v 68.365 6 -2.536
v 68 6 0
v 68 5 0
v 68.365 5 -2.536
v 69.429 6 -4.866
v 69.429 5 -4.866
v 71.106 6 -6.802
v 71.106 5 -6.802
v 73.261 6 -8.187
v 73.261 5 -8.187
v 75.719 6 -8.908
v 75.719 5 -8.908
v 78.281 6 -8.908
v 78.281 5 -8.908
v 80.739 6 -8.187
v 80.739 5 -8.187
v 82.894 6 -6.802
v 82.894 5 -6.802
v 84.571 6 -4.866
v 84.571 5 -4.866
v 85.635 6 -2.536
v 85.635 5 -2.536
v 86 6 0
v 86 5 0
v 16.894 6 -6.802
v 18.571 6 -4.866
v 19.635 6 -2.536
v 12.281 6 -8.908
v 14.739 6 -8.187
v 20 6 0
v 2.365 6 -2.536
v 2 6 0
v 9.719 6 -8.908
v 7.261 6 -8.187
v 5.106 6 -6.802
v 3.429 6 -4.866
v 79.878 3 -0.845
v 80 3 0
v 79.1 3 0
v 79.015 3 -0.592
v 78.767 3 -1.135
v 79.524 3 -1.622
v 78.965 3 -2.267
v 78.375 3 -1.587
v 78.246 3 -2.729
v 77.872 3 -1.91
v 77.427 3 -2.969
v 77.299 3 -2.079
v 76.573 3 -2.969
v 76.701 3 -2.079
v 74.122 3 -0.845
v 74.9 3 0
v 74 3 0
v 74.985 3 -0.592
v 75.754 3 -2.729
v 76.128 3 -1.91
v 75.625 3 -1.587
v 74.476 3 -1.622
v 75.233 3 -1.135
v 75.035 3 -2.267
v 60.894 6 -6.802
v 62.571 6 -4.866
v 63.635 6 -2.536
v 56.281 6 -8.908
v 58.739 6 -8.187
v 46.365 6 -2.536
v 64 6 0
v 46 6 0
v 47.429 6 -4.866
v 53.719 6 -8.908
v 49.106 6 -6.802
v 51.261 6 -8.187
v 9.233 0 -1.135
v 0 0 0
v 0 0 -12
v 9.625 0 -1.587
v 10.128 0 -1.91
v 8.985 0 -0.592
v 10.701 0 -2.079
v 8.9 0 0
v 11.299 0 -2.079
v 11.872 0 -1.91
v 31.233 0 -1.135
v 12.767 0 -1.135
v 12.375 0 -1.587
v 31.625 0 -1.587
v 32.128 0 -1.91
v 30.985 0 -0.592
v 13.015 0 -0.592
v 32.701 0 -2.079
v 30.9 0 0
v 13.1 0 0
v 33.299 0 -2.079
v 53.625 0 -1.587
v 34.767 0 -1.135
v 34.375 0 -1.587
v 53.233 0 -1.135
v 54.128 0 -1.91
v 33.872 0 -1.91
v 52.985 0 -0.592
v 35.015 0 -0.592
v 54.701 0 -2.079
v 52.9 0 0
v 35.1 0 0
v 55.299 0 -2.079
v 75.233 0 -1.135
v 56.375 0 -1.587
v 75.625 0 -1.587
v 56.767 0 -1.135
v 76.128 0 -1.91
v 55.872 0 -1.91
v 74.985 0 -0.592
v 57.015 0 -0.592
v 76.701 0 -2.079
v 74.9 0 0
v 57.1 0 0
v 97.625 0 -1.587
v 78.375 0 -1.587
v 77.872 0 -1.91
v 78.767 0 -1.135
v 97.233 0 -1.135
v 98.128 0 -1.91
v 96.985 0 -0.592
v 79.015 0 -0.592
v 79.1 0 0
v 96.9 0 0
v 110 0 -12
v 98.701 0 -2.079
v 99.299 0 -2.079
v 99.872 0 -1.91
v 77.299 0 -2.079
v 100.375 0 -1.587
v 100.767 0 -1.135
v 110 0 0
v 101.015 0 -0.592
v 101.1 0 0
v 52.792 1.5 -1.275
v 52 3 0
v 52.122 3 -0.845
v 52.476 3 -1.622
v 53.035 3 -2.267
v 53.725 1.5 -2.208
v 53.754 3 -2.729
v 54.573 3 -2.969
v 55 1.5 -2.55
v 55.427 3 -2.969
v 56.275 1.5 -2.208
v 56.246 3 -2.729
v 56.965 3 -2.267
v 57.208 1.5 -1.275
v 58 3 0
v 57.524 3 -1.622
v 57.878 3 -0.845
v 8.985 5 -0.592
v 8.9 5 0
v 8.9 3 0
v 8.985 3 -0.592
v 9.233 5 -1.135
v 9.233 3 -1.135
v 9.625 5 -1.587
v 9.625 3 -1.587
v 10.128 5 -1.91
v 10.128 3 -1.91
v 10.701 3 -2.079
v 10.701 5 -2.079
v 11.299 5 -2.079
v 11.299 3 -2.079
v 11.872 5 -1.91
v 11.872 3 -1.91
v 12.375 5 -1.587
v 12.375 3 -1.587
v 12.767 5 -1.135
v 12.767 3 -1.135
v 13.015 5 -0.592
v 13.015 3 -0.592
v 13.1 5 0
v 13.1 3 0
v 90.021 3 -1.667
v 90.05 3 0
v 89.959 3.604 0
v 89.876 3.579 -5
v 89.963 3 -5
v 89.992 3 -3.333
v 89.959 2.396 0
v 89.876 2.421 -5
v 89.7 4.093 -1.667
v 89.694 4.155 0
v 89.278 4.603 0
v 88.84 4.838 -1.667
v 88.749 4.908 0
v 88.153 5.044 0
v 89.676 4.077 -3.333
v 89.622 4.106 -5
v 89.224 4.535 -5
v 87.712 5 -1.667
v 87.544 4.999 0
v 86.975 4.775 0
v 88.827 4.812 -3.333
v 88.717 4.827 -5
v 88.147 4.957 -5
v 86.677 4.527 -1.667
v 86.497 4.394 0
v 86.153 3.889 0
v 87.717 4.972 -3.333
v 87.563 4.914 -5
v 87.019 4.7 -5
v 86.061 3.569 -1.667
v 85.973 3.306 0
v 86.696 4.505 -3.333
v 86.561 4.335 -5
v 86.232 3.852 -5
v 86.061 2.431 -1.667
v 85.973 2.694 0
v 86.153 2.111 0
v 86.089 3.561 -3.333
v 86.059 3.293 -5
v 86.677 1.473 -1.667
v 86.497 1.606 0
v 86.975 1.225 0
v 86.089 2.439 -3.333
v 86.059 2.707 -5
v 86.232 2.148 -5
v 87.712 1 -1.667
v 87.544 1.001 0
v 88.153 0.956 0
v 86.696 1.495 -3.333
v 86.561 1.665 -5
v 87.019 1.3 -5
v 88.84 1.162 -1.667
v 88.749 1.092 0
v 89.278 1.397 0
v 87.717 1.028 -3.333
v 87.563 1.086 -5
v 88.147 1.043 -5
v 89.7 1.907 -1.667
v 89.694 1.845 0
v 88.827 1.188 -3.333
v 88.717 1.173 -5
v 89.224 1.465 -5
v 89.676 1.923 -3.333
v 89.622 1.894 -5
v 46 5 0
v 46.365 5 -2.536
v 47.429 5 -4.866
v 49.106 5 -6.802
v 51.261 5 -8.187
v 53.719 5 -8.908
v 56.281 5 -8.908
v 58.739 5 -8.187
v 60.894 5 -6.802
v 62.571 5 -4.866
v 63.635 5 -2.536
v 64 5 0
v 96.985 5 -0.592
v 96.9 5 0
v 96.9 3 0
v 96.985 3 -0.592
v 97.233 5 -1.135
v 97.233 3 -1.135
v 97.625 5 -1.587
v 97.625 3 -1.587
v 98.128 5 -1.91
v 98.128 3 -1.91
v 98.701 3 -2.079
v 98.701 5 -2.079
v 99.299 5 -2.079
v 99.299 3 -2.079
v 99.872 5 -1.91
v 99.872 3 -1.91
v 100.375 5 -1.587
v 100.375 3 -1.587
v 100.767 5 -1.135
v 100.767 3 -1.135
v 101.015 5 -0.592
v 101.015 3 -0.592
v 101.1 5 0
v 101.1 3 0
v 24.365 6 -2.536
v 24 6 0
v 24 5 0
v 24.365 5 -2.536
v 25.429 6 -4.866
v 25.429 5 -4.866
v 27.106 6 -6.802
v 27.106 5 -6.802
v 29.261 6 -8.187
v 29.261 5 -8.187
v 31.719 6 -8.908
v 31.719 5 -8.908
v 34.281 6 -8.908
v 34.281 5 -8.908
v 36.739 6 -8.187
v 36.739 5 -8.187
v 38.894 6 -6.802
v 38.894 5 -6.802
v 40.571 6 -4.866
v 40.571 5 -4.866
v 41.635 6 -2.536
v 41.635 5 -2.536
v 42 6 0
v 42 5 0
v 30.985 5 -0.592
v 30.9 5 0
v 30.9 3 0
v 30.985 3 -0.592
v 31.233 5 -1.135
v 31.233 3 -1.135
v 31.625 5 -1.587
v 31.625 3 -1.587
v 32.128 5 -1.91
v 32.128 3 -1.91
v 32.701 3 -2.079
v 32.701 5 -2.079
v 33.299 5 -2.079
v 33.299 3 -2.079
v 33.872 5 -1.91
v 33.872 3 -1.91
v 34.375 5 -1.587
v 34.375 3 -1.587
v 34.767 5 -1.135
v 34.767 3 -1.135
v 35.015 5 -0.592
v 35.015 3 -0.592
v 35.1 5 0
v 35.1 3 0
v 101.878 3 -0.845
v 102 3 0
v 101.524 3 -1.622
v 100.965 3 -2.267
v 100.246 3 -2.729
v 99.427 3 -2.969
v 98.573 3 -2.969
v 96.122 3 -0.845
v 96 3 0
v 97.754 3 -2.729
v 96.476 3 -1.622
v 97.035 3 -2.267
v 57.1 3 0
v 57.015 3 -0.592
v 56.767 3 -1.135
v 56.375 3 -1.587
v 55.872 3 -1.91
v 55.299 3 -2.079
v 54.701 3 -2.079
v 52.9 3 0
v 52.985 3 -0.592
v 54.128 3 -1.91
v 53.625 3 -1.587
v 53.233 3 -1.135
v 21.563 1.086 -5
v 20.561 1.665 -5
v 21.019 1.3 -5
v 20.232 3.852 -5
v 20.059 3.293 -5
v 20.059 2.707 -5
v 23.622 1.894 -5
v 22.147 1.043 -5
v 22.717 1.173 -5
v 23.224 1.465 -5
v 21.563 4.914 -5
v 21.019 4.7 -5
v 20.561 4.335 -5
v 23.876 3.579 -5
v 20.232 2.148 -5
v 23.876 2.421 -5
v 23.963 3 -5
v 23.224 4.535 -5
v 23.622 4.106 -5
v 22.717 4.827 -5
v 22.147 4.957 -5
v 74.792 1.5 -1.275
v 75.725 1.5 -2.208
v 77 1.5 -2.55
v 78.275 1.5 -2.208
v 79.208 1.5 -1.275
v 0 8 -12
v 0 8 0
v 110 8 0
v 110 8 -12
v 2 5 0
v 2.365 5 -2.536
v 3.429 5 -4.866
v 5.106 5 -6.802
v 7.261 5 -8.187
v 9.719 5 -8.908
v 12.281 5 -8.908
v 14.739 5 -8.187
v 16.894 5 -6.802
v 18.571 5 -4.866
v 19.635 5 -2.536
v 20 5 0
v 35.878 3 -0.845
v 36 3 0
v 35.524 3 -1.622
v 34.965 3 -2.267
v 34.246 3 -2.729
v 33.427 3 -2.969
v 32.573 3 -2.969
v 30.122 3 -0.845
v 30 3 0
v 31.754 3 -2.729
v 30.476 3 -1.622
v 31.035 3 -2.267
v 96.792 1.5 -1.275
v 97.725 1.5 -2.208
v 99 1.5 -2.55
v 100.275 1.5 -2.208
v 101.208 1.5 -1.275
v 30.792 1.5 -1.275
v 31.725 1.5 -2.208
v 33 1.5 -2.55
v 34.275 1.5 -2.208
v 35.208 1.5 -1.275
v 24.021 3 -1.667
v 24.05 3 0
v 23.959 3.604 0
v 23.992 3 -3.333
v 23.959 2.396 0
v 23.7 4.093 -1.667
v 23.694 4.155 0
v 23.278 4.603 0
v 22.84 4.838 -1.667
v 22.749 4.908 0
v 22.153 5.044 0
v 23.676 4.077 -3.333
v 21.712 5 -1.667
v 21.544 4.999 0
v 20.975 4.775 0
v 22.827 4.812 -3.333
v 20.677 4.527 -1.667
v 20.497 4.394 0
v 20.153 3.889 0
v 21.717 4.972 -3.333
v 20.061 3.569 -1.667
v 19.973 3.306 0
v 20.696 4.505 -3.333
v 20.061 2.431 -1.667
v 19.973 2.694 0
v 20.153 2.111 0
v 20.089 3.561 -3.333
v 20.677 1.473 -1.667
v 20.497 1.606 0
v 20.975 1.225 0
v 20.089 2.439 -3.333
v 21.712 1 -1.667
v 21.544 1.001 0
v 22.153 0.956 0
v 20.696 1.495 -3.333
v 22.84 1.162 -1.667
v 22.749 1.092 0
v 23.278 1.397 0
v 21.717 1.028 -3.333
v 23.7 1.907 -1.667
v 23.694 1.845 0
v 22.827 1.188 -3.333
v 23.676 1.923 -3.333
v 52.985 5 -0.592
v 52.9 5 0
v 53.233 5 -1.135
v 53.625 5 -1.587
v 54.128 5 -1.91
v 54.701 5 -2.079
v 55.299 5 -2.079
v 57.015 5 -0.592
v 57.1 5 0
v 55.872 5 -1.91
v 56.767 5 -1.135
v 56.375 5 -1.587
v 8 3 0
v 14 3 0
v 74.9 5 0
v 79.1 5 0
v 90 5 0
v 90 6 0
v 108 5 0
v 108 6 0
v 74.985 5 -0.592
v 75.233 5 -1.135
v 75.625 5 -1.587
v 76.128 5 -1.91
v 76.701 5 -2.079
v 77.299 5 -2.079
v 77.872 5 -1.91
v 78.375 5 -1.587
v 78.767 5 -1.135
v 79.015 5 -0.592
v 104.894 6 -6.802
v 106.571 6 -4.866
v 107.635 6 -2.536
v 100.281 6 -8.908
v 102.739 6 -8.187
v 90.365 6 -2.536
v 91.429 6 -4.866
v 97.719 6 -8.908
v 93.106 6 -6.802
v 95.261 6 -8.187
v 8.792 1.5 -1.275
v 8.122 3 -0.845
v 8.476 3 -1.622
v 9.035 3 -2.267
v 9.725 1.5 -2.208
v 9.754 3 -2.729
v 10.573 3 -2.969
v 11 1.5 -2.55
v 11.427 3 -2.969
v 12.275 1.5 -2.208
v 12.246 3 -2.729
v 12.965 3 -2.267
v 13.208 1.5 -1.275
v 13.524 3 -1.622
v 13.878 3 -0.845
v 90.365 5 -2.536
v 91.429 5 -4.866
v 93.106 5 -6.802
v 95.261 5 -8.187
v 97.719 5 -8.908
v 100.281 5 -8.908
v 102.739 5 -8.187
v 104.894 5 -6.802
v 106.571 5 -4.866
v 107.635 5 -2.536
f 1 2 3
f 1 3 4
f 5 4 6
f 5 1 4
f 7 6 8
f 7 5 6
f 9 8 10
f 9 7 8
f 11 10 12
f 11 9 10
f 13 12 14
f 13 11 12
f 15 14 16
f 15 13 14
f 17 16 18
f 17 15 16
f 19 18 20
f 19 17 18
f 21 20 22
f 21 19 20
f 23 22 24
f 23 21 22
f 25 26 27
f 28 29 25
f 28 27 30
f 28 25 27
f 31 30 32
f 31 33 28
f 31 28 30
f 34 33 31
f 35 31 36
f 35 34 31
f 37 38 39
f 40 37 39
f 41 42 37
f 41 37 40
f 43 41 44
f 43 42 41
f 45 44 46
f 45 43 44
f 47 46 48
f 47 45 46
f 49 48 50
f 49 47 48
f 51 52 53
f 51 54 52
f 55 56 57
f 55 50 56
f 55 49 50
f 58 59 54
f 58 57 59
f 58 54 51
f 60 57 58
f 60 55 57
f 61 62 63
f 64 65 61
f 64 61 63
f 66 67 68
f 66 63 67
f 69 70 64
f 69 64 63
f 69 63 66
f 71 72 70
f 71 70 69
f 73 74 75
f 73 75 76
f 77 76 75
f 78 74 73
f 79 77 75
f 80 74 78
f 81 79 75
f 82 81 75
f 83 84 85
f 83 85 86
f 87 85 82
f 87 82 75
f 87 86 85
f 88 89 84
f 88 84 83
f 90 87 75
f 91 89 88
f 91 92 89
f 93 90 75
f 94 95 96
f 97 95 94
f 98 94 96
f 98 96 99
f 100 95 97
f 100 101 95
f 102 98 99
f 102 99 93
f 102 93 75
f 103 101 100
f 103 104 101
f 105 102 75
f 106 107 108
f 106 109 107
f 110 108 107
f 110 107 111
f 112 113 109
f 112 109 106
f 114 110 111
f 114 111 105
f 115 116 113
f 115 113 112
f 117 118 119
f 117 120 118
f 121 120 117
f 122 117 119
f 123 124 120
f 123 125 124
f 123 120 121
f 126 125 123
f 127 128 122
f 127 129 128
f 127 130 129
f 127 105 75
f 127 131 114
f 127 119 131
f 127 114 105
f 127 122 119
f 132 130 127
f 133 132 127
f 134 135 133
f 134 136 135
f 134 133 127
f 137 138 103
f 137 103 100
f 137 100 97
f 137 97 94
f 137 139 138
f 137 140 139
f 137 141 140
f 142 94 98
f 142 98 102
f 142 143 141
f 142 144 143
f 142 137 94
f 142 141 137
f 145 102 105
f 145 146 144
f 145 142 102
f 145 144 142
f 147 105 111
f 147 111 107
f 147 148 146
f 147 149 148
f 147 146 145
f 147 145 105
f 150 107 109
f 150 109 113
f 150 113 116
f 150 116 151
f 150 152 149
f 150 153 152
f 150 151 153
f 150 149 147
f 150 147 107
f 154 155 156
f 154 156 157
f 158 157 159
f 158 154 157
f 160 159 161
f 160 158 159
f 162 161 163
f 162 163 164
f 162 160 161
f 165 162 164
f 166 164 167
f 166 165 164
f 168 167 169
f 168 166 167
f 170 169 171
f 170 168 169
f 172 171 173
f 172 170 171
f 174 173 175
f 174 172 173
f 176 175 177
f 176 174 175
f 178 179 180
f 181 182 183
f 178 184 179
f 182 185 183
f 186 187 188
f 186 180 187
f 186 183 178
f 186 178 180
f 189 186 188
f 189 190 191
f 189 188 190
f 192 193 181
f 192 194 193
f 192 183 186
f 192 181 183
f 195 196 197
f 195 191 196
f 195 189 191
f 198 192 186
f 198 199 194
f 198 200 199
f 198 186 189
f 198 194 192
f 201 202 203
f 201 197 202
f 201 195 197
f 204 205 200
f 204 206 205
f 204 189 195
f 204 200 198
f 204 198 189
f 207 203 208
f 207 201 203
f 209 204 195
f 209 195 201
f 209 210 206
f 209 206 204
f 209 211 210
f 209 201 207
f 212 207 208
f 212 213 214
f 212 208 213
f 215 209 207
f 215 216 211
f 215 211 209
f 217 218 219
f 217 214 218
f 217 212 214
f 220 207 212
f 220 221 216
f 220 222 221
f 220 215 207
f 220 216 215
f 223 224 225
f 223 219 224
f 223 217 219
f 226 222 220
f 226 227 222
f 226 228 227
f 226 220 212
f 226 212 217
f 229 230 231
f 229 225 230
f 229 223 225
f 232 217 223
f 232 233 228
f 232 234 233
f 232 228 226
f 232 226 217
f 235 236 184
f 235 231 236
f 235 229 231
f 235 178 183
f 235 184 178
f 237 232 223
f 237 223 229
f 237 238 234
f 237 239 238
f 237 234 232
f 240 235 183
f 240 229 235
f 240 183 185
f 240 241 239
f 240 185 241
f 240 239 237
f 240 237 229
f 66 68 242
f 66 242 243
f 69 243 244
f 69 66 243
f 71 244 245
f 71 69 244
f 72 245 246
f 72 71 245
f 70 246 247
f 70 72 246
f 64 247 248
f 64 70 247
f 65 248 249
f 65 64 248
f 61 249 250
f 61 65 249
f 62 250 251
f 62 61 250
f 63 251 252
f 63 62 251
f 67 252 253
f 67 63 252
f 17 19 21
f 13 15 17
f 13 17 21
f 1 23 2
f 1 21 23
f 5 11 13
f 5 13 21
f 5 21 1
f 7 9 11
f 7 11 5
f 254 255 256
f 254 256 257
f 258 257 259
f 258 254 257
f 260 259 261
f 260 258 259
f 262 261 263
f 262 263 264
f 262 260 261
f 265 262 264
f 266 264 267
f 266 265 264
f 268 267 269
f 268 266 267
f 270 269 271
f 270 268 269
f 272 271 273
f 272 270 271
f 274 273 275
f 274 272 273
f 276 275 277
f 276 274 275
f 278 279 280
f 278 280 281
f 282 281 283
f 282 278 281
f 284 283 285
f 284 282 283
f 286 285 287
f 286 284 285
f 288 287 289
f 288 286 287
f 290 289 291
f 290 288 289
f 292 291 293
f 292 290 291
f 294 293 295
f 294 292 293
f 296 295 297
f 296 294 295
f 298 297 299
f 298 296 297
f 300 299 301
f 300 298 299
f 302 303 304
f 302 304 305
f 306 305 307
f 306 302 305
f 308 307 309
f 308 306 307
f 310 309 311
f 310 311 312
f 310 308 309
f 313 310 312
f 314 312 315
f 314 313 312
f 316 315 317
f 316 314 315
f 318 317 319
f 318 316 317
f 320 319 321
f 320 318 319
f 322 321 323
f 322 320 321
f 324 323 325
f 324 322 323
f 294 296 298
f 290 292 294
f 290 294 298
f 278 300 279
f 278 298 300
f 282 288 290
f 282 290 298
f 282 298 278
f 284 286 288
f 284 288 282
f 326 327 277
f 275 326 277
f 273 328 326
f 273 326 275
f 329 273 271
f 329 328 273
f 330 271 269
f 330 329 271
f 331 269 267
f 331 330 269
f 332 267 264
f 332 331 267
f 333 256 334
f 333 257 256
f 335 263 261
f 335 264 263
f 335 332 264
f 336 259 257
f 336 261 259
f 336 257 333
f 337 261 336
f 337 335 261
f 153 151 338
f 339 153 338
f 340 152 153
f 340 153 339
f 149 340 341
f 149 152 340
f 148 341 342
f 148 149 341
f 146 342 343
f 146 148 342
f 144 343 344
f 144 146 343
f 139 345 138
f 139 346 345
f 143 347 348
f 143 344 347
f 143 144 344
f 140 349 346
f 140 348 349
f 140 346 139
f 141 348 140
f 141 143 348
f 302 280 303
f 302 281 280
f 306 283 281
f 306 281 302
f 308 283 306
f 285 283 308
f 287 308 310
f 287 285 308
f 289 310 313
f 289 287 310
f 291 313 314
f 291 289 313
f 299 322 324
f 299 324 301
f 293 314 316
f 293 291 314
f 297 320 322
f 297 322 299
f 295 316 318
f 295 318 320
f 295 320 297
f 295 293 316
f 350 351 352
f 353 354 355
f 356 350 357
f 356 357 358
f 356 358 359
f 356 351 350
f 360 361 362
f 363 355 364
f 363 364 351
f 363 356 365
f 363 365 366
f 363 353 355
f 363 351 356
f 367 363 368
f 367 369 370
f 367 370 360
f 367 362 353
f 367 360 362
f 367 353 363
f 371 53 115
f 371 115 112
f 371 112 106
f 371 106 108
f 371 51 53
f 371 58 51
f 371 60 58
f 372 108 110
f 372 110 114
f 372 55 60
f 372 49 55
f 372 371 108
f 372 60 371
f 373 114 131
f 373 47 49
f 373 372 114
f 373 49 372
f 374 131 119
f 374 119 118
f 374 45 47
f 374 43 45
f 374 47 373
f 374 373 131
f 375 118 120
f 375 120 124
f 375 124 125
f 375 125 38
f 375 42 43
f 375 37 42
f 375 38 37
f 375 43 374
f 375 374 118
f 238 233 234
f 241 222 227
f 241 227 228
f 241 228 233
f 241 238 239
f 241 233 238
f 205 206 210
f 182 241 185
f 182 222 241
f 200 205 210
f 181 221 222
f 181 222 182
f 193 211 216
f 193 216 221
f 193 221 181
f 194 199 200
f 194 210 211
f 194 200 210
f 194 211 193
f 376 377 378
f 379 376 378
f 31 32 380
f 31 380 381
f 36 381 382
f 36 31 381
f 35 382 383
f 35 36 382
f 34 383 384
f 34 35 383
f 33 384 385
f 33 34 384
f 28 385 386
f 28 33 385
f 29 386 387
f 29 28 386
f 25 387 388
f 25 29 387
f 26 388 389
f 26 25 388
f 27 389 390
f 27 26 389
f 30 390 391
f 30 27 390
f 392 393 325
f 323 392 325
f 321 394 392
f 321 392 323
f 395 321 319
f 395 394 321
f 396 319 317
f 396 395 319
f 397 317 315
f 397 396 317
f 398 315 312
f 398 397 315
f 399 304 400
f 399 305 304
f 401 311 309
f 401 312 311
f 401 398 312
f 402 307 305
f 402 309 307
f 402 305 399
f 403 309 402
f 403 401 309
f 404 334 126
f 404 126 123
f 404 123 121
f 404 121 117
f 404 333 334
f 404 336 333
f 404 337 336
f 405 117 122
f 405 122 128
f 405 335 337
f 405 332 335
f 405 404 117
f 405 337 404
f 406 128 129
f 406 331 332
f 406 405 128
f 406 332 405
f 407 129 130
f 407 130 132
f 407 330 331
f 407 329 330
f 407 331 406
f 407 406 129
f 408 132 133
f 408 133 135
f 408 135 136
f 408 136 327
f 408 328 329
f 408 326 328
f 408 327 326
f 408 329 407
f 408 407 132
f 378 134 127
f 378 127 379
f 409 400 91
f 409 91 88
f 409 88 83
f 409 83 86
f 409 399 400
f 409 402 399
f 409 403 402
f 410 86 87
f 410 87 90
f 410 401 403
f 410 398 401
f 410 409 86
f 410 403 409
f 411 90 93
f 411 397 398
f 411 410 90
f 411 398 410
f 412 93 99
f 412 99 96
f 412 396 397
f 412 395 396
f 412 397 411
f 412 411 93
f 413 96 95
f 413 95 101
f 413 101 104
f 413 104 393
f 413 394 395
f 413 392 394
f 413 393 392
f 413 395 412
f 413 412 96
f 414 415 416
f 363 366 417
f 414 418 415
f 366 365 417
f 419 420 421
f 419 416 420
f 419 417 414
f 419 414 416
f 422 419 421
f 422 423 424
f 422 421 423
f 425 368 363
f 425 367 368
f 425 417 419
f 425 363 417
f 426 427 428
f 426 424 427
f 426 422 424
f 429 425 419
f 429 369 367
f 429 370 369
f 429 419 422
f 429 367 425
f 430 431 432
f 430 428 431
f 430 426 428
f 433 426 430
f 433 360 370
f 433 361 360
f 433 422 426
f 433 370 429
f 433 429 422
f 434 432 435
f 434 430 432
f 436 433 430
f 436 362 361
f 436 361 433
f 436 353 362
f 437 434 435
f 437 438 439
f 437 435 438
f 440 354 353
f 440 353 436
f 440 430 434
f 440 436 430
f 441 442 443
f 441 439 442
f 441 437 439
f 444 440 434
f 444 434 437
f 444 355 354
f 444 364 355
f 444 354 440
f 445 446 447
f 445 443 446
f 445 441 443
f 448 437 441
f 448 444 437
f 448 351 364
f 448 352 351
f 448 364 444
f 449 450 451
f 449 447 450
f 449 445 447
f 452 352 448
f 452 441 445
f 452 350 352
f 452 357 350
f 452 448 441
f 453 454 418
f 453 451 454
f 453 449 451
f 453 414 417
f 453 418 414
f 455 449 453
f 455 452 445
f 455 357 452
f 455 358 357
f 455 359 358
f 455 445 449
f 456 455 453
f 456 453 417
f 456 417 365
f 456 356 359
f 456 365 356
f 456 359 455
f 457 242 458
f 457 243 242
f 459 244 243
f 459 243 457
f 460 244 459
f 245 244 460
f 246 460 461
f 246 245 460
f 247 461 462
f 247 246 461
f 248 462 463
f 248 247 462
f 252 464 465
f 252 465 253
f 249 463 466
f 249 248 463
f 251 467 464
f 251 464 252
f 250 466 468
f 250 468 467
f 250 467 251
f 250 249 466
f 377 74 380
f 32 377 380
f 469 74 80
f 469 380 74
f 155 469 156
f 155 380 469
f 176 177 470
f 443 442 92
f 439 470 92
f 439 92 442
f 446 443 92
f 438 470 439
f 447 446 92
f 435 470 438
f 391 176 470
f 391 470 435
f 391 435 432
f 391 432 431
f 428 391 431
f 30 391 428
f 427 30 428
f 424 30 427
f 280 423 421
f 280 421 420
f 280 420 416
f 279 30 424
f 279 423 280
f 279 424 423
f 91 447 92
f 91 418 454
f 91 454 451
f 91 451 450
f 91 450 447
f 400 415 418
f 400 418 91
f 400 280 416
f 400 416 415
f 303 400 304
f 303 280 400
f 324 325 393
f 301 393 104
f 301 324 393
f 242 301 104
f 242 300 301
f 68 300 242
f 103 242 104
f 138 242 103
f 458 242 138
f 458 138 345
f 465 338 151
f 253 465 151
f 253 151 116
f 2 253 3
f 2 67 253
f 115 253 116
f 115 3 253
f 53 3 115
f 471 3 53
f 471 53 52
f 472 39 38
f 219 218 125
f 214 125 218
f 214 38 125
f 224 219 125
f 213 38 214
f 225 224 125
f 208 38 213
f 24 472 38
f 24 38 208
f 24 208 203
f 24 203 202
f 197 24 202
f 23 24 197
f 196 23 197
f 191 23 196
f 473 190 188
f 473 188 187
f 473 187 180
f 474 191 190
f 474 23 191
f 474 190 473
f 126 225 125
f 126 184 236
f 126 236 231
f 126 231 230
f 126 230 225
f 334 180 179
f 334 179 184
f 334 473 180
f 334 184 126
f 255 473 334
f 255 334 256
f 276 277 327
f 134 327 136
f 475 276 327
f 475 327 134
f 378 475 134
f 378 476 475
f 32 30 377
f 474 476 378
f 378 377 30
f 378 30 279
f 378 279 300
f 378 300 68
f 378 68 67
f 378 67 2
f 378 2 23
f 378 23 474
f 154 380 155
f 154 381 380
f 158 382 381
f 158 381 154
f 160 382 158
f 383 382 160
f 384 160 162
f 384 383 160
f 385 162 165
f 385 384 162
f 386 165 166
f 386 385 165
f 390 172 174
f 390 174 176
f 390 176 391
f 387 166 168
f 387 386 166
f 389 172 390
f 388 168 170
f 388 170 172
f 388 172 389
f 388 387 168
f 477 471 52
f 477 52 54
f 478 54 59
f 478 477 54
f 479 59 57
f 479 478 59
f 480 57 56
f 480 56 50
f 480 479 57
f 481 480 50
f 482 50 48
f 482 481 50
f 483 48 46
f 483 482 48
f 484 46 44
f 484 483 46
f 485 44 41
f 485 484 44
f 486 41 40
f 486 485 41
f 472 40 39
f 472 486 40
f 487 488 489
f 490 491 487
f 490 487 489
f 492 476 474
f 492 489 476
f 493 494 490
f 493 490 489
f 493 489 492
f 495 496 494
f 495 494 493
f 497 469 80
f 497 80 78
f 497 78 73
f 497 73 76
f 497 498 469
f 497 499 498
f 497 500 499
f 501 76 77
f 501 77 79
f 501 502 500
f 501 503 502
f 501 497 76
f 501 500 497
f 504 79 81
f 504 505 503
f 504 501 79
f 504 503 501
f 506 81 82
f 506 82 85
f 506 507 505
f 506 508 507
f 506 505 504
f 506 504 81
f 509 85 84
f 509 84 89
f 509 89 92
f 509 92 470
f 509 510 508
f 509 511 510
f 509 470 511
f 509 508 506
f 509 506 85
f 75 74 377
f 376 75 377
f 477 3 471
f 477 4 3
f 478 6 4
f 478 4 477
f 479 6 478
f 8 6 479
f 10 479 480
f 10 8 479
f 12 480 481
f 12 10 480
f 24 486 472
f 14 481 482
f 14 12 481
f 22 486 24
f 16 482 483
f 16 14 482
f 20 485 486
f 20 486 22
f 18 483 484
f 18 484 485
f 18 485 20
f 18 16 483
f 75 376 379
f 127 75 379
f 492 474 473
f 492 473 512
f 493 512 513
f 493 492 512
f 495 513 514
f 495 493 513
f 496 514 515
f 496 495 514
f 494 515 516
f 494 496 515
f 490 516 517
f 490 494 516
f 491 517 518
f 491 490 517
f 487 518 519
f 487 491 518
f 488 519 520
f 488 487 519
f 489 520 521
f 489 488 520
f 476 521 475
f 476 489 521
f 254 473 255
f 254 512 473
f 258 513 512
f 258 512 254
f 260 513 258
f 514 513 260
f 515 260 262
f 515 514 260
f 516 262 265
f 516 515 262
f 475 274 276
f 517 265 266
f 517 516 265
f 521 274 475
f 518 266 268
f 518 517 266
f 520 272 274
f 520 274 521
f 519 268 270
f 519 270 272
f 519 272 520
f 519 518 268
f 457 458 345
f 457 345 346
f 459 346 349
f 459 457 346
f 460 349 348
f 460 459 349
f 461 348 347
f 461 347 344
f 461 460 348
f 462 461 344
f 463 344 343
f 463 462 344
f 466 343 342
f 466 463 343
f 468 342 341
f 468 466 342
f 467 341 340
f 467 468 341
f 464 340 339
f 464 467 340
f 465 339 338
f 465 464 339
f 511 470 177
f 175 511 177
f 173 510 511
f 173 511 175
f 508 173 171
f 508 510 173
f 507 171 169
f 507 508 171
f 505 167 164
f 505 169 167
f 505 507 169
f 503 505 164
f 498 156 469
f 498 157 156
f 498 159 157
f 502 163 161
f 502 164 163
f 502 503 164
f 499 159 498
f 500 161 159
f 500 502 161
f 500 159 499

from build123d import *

# Parameters (mm, degrees)
SKETCH2_W           = 110
SKETCH2_H           = 8
BOSS_EXTRUDE1_DEPTH = 12
LPATTERN1_COUNT     = 5
LPATTERN1_PITCH     = 22
SKETCH4_R           = 2.05
CUT_EXTRUDE1_DEPTH  = 5
CUT_EXTRUDE1_TAPER  = 1


with BuildPart() as part:
    # Sketch2 → Boss-Extrude1 (new body)
    with BuildSketch(Plane.XY):
        with Locations((55, 4)):
            Rectangle(SKETCH2_W, SKETCH2_H)
    extrude(amount=-BOSS_EXTRUDE1_DEPTH)

    # Sketch3 → Cut-Revolve1 (revolve, cut)
    with BuildSketch(Plane.XY):
        Polygon((8, 3), (8.9, 3), (8.9, 5), (2, 5), (2, 6), (11, 6), (11, 0), (8.9, 0), align=None)
    cut_revolve1 = revolve(axis=Axis((11, 6, 0), (0, -1, 0)), mode=Mode.SUBTRACT)

    # LPattern1: Cut-Revolve1 ×5
    with Locations(*[(i * LPATTERN1_PITCH, 0, 0) for i in range(1, LPATTERN1_COUNT)]):
        add(cut_revolve1, mode=Mode.SUBTRACT)

    # Sketch4 → Cut-Extrude1 (cut)
    with BuildSketch(Plane.XY):
        with Locations((22, 3)):
            Circle(SKETCH4_R)
        with Locations((88, 3)):
            Circle(SKETCH4_R)
    extrude(amount=-CUT_EXTRUDE1_DEPTH, taper=CUT_EXTRUDE1_TAPER, mode=Mode.SUBTRACT)


solid = part.part
